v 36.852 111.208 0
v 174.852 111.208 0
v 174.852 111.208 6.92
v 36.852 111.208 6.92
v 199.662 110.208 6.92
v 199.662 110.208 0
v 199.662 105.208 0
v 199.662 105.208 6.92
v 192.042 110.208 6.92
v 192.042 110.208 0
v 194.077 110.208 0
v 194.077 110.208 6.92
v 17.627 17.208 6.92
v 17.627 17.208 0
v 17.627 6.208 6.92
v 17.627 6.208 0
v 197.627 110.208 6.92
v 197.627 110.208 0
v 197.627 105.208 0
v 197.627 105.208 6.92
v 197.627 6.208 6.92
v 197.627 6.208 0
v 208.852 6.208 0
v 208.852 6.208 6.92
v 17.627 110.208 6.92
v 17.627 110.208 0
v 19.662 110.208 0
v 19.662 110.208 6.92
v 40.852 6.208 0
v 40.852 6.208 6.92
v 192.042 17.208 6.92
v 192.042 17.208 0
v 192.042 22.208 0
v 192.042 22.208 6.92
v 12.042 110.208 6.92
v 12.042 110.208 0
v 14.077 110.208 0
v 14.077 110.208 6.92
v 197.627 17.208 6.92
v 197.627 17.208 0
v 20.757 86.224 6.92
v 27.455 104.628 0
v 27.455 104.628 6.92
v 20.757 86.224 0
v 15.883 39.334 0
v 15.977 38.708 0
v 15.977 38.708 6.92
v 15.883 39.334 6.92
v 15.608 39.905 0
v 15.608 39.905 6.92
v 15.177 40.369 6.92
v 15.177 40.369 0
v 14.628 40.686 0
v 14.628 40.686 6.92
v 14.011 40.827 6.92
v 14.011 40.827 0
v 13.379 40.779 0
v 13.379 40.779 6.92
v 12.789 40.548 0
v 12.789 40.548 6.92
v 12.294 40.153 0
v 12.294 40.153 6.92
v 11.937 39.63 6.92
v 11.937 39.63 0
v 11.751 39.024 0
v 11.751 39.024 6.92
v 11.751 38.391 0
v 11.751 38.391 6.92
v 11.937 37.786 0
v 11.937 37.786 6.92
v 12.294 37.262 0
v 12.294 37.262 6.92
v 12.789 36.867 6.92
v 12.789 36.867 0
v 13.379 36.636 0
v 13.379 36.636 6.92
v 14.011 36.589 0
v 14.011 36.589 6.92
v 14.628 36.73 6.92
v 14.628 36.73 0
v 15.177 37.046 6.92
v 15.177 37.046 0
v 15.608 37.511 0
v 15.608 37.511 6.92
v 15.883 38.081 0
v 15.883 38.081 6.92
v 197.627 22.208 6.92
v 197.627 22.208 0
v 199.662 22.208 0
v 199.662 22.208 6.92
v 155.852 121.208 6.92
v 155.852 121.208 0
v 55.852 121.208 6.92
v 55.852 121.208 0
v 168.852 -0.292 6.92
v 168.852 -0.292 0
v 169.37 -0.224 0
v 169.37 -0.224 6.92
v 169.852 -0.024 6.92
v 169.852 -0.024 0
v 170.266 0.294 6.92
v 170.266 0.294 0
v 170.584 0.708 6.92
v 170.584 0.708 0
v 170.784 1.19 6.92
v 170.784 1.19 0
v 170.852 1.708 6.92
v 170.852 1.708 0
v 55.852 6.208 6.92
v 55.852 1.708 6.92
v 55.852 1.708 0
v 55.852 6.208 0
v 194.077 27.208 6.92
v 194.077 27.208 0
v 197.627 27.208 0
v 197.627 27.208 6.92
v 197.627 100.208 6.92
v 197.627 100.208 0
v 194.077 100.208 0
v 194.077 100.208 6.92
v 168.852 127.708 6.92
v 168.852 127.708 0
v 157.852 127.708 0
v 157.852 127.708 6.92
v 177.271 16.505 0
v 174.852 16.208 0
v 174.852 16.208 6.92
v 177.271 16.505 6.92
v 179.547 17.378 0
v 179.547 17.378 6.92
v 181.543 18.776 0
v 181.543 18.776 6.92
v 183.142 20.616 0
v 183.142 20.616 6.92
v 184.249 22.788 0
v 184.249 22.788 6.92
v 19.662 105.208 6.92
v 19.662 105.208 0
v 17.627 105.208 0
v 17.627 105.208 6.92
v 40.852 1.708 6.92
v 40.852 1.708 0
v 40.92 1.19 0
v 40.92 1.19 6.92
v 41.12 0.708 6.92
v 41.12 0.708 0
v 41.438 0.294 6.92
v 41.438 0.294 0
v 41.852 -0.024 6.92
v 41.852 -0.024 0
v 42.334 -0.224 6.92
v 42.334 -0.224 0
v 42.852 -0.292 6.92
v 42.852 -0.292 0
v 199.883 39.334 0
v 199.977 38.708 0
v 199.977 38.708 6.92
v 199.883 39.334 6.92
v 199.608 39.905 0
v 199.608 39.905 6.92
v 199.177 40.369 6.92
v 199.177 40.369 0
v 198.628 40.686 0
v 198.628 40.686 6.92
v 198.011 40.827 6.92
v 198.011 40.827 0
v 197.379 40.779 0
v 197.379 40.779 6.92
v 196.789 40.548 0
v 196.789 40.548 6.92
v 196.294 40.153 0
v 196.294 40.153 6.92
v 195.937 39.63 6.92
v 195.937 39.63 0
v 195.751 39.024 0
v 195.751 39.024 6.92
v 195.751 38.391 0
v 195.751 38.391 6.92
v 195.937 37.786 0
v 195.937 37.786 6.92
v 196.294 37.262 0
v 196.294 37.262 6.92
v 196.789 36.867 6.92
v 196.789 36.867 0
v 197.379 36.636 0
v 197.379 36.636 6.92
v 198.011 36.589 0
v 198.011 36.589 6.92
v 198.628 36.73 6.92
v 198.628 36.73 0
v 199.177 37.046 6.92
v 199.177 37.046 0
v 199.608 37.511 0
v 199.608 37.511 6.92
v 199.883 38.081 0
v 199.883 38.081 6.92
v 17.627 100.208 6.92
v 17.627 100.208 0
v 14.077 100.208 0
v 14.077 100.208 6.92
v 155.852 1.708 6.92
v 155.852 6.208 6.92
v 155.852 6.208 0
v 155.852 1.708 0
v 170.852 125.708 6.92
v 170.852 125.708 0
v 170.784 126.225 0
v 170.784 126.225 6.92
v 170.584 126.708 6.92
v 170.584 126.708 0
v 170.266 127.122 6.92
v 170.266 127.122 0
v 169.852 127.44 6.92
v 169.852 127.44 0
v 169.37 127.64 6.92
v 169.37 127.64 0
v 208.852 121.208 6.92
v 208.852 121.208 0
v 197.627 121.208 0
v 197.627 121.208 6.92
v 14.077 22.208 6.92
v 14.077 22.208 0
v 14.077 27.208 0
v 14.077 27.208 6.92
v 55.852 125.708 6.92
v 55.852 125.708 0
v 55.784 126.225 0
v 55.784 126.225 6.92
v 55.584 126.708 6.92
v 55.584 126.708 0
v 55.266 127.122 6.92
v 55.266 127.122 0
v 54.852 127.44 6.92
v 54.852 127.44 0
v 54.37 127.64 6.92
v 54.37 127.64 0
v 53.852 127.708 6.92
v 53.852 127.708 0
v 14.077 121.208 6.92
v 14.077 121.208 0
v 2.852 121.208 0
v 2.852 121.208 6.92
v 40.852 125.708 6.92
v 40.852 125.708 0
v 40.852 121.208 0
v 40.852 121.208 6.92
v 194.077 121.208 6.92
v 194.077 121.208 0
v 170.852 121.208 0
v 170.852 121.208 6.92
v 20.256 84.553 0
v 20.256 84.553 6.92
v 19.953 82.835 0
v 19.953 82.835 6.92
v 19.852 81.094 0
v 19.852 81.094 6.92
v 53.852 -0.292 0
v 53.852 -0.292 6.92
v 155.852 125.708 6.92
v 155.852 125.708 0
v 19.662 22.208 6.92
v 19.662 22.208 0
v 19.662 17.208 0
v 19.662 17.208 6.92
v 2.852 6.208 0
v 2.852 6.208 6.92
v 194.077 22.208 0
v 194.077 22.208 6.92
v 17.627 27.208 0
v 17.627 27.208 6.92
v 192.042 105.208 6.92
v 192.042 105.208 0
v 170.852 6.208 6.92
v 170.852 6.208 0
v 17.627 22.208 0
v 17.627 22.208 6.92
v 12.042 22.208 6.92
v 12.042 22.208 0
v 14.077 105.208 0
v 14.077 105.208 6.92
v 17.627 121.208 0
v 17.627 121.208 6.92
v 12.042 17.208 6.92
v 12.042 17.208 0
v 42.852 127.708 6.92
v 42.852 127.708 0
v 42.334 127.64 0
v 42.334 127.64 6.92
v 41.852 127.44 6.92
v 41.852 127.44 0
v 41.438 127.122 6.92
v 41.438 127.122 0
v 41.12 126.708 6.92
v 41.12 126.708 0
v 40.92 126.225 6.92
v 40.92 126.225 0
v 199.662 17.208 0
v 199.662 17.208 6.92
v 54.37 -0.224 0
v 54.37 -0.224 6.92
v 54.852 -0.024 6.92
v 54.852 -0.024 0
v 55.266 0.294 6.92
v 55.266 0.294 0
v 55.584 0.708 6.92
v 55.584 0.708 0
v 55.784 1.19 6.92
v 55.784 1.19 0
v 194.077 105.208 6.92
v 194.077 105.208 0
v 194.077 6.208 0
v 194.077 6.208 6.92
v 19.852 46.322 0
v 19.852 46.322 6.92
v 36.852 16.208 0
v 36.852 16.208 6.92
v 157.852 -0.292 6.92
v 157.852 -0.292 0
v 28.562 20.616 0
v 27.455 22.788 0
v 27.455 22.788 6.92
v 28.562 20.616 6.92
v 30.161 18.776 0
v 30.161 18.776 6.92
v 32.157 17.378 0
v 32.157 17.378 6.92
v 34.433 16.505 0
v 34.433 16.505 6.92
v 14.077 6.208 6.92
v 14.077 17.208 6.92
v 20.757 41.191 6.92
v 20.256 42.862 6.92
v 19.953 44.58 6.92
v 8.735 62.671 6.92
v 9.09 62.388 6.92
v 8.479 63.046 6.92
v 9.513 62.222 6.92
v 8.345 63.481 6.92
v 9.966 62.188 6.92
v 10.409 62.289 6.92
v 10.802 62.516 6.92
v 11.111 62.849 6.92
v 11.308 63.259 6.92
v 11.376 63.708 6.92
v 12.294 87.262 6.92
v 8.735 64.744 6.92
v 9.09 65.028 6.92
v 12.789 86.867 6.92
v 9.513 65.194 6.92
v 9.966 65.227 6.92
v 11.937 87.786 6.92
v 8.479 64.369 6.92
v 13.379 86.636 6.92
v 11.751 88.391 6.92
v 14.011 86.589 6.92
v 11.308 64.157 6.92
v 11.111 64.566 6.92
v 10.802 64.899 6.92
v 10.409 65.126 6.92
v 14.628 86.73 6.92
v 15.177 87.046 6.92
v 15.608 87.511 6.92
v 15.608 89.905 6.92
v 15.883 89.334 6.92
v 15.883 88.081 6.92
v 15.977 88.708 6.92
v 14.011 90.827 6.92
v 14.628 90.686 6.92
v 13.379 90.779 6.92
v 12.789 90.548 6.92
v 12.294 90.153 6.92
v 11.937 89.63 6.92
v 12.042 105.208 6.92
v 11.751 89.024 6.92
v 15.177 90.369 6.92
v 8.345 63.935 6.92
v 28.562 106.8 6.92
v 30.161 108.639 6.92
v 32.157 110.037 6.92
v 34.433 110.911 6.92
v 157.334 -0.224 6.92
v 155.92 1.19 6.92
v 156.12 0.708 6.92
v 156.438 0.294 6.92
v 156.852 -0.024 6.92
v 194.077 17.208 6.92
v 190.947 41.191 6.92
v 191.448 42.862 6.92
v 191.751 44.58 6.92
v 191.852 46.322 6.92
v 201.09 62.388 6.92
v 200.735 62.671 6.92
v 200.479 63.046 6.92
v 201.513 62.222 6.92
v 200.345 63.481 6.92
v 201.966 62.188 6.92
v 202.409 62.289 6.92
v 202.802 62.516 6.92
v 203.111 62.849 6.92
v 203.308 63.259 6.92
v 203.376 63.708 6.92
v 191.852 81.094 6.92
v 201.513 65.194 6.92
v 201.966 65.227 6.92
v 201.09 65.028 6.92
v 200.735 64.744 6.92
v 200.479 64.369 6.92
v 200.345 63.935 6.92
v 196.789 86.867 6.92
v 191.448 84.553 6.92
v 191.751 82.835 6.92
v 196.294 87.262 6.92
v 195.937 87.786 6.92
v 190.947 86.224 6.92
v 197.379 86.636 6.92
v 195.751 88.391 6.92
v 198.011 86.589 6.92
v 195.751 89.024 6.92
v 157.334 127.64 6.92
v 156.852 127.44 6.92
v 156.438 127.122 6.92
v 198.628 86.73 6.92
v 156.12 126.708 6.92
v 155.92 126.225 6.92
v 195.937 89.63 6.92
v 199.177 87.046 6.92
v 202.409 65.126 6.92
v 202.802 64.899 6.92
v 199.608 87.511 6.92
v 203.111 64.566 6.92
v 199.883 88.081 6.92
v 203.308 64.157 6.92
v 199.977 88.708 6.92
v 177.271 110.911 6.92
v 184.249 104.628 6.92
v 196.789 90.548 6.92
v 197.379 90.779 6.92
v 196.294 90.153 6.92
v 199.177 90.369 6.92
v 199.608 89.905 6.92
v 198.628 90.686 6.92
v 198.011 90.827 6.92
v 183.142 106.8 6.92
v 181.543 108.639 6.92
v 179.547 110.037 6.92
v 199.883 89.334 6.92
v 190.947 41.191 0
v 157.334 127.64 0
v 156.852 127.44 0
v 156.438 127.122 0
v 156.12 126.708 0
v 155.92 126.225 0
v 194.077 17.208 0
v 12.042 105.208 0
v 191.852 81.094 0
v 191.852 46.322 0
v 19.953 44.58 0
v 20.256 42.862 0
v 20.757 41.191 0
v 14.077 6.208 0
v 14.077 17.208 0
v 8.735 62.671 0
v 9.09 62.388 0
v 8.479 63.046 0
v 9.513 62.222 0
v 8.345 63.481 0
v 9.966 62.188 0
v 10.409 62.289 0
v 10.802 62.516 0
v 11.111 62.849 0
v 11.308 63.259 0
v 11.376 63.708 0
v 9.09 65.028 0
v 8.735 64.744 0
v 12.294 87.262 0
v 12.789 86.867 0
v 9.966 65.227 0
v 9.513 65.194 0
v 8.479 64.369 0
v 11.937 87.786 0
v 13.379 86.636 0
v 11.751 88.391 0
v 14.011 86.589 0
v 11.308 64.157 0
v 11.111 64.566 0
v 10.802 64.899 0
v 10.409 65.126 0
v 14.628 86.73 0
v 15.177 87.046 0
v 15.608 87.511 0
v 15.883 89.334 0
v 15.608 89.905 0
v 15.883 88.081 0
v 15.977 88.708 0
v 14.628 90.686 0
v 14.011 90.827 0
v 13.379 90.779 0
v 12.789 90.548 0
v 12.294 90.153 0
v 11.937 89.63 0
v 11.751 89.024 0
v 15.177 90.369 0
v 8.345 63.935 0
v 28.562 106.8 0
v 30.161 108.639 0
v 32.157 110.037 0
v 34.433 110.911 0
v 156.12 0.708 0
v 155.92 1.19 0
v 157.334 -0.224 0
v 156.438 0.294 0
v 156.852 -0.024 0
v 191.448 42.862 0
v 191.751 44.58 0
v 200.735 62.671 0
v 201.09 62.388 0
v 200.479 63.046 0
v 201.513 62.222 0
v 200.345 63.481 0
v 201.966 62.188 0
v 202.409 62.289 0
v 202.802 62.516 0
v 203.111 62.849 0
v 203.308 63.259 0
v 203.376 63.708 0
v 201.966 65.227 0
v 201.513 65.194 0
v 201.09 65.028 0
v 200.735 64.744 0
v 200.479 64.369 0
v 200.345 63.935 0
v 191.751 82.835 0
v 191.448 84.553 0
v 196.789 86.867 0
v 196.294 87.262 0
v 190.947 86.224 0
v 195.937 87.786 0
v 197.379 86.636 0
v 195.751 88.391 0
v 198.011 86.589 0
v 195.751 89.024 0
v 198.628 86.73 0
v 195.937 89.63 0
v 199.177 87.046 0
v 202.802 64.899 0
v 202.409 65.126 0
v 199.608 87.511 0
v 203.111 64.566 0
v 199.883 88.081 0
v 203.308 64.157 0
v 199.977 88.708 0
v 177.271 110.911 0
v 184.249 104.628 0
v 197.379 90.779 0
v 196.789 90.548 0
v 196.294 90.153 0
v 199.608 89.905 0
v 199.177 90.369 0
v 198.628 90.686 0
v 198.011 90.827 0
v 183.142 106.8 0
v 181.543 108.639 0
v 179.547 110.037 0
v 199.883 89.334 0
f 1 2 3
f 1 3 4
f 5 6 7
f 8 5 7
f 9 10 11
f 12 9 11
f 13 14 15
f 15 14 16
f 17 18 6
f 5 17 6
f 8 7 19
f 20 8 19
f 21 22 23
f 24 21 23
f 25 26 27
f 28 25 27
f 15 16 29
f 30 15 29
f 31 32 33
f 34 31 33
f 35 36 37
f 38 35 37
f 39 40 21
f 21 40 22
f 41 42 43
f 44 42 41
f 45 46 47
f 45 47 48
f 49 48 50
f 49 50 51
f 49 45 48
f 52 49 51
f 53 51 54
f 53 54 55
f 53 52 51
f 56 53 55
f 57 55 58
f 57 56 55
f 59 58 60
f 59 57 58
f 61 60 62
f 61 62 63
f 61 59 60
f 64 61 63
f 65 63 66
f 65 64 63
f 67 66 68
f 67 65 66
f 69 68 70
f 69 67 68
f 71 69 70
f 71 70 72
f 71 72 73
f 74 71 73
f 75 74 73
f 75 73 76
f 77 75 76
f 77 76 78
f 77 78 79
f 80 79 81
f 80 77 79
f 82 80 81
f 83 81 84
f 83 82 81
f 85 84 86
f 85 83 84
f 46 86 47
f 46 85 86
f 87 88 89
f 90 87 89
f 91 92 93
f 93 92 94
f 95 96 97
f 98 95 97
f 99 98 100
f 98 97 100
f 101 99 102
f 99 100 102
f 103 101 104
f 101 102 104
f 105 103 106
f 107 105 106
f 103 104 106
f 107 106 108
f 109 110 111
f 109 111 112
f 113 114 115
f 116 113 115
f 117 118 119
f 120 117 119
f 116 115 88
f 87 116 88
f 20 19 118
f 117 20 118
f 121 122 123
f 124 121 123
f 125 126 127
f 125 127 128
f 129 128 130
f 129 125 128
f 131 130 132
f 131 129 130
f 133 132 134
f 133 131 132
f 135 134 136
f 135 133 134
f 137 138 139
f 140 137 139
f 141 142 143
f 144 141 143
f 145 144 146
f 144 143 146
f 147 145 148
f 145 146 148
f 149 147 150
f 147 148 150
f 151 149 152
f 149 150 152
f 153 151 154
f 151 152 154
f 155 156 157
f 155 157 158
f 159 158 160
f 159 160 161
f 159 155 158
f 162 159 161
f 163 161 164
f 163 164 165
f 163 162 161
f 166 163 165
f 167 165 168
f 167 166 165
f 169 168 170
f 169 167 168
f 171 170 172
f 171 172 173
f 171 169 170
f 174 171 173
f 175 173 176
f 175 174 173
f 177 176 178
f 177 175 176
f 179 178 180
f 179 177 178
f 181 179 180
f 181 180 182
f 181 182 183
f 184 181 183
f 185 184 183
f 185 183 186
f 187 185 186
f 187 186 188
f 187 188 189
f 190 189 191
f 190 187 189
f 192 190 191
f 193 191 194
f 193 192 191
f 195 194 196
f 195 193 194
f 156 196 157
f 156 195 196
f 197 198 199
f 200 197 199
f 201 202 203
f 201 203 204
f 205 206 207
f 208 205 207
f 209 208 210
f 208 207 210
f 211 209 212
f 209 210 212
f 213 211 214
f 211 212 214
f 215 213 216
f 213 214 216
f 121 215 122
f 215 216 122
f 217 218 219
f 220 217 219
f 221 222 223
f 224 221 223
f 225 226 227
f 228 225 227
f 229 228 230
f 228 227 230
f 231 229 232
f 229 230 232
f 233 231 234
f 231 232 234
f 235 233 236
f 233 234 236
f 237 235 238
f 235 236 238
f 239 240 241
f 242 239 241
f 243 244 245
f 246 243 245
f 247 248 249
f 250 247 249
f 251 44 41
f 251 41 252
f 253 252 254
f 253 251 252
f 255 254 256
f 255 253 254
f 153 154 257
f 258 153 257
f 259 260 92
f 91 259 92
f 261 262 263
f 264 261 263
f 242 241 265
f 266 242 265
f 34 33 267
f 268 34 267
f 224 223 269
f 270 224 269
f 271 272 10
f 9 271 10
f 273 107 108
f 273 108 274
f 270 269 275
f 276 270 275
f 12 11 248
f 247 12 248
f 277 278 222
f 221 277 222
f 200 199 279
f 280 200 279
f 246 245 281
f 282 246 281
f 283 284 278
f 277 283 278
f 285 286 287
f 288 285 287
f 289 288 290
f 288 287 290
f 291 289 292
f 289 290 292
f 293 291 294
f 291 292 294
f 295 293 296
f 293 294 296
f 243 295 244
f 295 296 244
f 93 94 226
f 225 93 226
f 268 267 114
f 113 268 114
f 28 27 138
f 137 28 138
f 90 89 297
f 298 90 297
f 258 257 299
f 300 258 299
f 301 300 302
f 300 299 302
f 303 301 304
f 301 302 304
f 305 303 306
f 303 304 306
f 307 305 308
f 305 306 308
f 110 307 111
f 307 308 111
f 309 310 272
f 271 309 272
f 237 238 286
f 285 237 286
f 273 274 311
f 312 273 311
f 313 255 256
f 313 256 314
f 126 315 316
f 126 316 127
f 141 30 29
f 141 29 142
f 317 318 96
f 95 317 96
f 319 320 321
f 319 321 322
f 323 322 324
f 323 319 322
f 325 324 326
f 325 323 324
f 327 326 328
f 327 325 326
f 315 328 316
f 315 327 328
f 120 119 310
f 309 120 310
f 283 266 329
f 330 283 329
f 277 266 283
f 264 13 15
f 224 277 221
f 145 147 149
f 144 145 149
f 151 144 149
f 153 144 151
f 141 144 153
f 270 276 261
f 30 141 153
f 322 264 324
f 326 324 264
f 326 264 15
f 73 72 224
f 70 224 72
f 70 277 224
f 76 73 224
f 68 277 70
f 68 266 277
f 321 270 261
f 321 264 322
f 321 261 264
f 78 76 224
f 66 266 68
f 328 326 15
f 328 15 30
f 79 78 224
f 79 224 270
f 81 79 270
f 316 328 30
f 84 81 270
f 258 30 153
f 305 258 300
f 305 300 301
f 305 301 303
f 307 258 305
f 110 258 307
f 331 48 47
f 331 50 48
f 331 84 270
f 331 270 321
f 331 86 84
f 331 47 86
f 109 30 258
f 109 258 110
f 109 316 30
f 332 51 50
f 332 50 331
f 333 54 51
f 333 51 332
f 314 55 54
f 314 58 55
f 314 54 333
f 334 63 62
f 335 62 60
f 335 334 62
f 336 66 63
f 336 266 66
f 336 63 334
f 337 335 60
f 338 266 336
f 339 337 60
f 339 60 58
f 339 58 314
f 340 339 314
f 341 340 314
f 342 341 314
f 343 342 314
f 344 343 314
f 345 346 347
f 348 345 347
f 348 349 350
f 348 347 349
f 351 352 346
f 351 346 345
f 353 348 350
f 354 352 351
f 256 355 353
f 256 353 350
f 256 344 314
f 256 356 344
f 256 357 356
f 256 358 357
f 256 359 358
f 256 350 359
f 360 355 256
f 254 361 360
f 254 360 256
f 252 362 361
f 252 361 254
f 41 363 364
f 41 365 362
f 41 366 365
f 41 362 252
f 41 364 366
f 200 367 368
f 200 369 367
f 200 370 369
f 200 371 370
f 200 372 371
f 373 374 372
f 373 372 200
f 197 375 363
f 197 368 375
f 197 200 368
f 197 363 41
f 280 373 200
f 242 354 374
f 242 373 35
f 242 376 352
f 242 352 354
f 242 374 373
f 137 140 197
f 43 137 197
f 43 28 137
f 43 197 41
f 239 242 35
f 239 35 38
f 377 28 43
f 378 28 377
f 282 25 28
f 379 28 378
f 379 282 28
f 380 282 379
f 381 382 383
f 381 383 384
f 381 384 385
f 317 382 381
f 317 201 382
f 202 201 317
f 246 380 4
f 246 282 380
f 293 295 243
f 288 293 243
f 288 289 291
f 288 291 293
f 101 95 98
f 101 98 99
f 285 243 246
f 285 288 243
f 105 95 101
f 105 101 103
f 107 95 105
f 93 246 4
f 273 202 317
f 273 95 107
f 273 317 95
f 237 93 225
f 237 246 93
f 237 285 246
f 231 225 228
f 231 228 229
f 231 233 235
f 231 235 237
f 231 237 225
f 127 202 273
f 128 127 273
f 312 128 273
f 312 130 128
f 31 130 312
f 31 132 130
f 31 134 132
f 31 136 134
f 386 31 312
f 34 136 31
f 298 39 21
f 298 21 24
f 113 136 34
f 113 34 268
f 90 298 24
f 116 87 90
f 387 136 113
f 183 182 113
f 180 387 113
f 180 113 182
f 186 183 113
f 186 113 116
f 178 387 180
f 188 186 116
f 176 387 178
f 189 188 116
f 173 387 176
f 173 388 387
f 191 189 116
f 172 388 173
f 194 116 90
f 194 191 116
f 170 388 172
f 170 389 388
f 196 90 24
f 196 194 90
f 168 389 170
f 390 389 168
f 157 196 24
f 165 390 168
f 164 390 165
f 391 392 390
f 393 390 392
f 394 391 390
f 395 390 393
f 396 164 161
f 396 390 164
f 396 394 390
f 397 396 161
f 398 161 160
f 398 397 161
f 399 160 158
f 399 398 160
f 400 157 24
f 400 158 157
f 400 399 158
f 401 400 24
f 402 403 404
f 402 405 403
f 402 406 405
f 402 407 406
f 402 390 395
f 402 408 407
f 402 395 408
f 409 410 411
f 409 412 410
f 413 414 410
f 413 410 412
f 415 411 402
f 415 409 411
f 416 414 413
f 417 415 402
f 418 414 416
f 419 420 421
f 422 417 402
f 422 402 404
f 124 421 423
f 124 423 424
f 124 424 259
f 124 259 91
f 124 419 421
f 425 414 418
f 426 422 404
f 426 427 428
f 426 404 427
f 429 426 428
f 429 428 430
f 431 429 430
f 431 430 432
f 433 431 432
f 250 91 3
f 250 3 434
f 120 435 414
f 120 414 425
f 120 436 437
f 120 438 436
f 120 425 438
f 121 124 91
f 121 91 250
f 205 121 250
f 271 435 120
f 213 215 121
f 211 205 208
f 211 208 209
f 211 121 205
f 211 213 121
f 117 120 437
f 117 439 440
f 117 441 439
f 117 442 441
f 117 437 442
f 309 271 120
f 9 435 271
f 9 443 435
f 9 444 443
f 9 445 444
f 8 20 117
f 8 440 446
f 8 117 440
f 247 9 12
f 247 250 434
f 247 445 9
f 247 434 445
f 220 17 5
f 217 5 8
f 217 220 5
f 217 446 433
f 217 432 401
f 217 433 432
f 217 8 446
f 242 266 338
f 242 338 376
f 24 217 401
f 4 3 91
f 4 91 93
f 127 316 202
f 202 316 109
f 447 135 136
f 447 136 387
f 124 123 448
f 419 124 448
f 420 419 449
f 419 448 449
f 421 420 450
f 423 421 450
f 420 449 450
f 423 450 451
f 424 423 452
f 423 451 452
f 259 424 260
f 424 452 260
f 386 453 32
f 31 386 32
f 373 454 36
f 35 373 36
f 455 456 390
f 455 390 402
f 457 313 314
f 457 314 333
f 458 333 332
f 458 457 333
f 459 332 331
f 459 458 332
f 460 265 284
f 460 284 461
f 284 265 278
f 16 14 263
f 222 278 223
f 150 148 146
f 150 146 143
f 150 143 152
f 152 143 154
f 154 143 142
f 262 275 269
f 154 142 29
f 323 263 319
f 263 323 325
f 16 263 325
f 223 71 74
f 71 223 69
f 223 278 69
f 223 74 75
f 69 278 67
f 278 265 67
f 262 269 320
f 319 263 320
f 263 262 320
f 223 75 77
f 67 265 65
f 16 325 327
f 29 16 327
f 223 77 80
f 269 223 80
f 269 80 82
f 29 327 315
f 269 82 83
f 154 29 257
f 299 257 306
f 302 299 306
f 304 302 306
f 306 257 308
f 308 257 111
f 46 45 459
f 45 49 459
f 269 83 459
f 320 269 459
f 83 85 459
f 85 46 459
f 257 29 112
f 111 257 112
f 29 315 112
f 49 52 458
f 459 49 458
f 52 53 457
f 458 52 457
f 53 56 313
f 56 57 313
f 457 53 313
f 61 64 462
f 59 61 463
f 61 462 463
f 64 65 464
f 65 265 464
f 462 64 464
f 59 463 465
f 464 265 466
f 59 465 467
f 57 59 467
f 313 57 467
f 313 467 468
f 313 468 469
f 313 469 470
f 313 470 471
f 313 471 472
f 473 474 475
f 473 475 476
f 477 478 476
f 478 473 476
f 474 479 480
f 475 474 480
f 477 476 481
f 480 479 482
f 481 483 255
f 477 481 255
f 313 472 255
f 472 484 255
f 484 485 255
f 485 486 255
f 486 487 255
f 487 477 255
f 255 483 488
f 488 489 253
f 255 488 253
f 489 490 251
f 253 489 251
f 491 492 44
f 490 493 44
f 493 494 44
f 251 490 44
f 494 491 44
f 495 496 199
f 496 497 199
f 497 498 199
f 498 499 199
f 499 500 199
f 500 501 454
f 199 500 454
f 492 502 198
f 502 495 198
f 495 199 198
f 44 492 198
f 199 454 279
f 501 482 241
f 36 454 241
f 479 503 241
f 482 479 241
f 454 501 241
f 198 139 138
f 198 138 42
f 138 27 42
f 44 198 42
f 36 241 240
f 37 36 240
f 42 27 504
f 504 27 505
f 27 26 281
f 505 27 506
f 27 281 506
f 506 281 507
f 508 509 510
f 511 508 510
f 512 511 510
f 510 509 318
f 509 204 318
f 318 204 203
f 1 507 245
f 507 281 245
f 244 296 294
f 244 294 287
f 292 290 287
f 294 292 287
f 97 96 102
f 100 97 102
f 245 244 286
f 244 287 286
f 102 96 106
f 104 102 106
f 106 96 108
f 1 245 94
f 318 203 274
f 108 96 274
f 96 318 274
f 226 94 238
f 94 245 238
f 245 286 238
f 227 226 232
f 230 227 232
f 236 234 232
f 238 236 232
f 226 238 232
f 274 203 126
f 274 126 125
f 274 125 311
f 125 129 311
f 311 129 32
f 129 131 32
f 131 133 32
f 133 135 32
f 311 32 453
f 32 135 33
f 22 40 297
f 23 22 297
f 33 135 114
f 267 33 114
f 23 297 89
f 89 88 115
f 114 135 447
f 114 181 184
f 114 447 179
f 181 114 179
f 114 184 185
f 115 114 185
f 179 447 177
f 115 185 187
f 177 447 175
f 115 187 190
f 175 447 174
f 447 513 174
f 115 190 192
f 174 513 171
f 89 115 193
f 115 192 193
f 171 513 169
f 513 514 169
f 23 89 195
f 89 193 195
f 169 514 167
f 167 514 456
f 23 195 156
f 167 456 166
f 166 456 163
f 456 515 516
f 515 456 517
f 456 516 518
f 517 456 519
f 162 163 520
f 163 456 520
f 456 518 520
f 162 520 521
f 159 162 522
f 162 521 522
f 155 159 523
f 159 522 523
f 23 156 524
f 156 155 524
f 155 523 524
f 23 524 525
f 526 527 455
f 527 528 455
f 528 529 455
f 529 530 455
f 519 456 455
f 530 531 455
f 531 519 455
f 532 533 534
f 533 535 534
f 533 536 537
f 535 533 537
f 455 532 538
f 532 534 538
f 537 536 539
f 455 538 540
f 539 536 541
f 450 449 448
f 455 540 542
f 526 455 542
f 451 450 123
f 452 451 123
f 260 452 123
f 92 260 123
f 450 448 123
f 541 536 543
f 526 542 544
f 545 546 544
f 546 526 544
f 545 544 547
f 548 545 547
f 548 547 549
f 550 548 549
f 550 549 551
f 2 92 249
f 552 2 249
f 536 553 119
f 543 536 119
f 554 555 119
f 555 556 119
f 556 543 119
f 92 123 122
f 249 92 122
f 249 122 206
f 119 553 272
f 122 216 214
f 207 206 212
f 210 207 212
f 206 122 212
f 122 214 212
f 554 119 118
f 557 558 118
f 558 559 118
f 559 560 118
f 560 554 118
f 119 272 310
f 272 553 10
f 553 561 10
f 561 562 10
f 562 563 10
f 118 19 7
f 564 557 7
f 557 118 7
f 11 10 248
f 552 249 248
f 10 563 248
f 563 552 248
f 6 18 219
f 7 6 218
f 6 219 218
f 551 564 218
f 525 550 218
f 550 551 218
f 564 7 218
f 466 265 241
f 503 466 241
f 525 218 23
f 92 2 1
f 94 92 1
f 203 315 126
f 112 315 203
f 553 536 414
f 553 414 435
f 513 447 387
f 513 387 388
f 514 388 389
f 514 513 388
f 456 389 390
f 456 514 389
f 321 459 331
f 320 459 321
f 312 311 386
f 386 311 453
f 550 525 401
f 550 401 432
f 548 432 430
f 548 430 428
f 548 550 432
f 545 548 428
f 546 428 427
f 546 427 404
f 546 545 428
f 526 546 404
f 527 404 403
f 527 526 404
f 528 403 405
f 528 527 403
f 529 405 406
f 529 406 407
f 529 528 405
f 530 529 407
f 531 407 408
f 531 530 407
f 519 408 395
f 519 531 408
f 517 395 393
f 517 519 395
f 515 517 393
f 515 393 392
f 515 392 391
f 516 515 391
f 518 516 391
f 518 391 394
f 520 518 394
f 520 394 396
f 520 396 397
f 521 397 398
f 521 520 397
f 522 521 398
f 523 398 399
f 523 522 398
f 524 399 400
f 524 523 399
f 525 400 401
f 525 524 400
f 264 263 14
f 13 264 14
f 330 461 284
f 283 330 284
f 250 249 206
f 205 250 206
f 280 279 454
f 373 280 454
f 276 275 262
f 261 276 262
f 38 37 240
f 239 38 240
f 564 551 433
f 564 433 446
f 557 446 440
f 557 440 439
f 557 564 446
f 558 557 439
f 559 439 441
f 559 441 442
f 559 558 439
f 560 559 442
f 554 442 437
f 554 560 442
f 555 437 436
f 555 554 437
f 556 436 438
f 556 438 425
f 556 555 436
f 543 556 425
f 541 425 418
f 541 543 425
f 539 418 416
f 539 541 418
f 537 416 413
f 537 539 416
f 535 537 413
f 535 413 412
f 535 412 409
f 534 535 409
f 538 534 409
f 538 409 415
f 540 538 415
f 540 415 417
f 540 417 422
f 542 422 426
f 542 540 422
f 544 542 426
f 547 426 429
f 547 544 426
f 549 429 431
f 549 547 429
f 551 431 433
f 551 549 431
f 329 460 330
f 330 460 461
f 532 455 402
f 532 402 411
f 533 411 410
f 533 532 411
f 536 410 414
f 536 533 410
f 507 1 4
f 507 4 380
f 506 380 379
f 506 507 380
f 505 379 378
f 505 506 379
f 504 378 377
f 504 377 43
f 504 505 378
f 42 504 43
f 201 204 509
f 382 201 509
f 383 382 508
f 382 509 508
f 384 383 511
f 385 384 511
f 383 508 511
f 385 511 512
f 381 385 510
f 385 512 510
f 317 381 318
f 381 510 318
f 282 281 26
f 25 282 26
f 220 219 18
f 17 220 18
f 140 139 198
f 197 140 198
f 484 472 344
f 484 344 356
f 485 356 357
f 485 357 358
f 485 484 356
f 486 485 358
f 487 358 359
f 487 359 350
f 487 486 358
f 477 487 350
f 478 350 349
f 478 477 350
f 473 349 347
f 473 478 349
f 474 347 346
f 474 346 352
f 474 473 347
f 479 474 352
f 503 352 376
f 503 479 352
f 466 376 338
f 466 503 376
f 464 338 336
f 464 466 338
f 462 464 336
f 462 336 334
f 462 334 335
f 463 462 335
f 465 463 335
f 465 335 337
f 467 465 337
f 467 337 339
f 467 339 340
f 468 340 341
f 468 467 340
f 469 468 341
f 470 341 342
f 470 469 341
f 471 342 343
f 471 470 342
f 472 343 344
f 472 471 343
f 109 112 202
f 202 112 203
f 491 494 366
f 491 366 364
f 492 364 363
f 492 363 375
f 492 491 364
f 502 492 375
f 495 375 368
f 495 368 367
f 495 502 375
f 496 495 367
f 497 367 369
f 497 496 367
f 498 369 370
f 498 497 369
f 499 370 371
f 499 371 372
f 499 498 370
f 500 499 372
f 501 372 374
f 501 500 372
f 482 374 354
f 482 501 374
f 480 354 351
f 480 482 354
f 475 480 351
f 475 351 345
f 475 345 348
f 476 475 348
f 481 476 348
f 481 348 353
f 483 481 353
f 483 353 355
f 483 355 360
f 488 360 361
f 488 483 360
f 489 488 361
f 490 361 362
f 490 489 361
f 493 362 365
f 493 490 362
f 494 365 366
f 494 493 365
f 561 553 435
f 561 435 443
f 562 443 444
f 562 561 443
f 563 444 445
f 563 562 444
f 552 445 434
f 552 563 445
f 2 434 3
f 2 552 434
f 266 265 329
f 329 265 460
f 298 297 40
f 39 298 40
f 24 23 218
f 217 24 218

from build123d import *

# Parameters (mm, degrees)
SKETCH1_R           = 2.125
SKETCH1_R_2         = 1.524
BOSS_EXTRUDE1_DEPTH = 6.92


with BuildPart() as part:
    # Sketch1 → Boss-Extrude1 (new body)
    with BuildSketch(Plane.XY):
        with BuildLine():
            Line((192.041969112, 105.207722008), (192.041969112, 110.207722008))
            Line((192.041969112, 110.207722008), (194.076969112, 110.207722008))
            Line((194.076969112, 110.207722008), (194.076969112, 121.207722008))
            Line((194.076969112, 121.207722008), (170.851969112, 121.207722008))
            Line((170.851969112, 121.207722008), (170.851969112, 125.707722008))
            ThreePointArc((170.851969112, 125.707722008), (170.266182674, 127.12193557), (168.851969112, 127.707722008))
            Line((168.851969112, 127.707722008), (157.851969112, 127.707722008))
            ThreePointArc((157.851969112, 127.707722008), (156.43775555, 127.12193557), (155.851969112, 125.707722008))
            Line((155.851969112, 125.707722008), (155.851969112, 121.207722008))
            Line((155.851969112, 121.207722008), (55.851969112, 121.207722008))
            Line((55.851969112, 121.207722008), (55.851969112, 125.707722008))
            ThreePointArc((55.851969112, 125.707722008), (55.266182674, 127.12193557), (53.851969112, 127.707722008))
            Line((53.851969112, 127.707722008), (42.851969112, 127.707722008))
            ThreePointArc((42.851969112, 127.707722008), (41.43775555, 127.12193557), (40.851969112, 125.707722008))
            Line((40.851969112, 125.707722008), (40.851969112, 121.207722008))
            Line((40.851969112, 121.207722008), (17.626969112, 121.207722008))
            Line((17.626969112, 121.207722008), (17.626969112, 110.207722008))
            Line((17.626969112, 110.207722008), (19.661969112, 110.207722008))
            Line((19.661969112, 110.207722008), (19.661969112, 105.207722008))
            Line((19.661969112, 105.207722008), (17.626969112, 105.207722008))
            Line((17.626969112, 105.207722008), (17.626969112, 100.207722008))
            Line((17.626969112, 100.207722008), (14.076969112, 100.207722008))
            Line((14.076969112, 100.207722008), (14.076969112, 105.207722008))
            Line((14.076969112, 105.207722008), (12.041969112, 105.207722008))
            Line((12.041969112, 105.207722008), (12.041969112, 110.207722008))
            Line((12.041969112, 110.207722008), (14.076969112, 110.207722008))
            Line((14.076969112, 110.207722008), (14.076969112, 121.207722008))
            Line((14.076969112, 121.207722008), (2.851969112, 121.207722008))
            Line((2.851969112, 121.207722008), (2.851969112, 6.207722008))
            Line((2.851969112, 6.207722008), (14.076969112, 6.207722008))
            Line((14.076969112, 6.207722008), (14.076969112, 17.207722008))
            Line((14.076969112, 17.207722008), (12.041969112, 17.207722008))
            Line((12.041969112, 17.207722008), (12.041969112, 22.207722008))
            Line((12.041969112, 22.207722008), (14.076969112, 22.207722008))
            Line((14.076969112, 22.207722008), (14.076969112, 27.207722008))
            Line((14.076969112, 27.207722008), (17.626969112, 27.207722008))
            Line((17.626969112, 27.207722008), (17.626969112, 22.207722008))
            Line((17.626969112, 22.207722008), (19.661969112, 22.207722008))
            Line((19.661969112, 22.207722008), (19.661969112, 17.207722008))
            Line((19.661969112, 17.207722008), (17.626969112, 17.207722008))
            Line((17.626969112, 17.207722008), (17.626969112, 6.207722008))
            Line((17.626969112, 6.207722008), (40.851969112, 6.207722008))
            Line((40.851969112, 6.207722008), (40.851969112, 1.707722008))
            ThreePointArc((40.851969112, 1.707722008), (41.43775555, 0.293508445), (42.851969112, -0.292277992))
            Line((42.851969112, -0.292277992), (53.851969112, -0.292277992))
            ThreePointArc((53.851969112, -0.292277992), (55.266182674, 0.293508445), (55.851969112, 1.707722008))
            Line((55.851969112, 1.707722008), (55.851969112, 6.207722008))
            Line((55.851969112, 6.207722008), (155.851969112, 6.207722008))
            Line((155.851969112, 6.207722008), (155.851969112, 1.707722008))
            ThreePointArc((155.851969112, 1.707722008), (156.43775555, 0.293508445), (157.851969112, -0.292277992))
            Line((157.851969112, -0.292277992), (168.851969112, -0.292277992))
            ThreePointArc((168.851969112, -0.292277992), (170.266182674, 0.293508445), (170.851969112, 1.707722008))
            Line((170.851969112, 1.707722008), (170.851969112, 6.207722008))
            Line((170.851969112, 6.207722008), (194.076969112, 6.207722008))
            Line((194.076969112, 6.207722008), (194.076969112, 17.207722008))
            Line((194.076969112, 17.207722008), (192.041969112, 17.207722008))
            Line((192.041969112, 17.207722008), (192.041969112, 22.207722008))
            Line((192.041969112, 22.207722008), (194.076969112, 22.207722008))
            Line((194.076969112, 22.207722008), (194.076969112, 27.207722008))
            Line((194.076969112, 27.207722008), (197.626969112, 27.207722008))
            Line((197.626969112, 27.207722008), (197.626969112, 22.207722008))
            Line((197.626969112, 22.207722008), (199.661969112, 22.207722008))
            Line((199.661969112, 22.207722008), (199.661969112, 17.207722008))
            Line((199.661969112, 17.207722008), (197.626969112, 17.207722008))
            Line((197.626969112, 17.207722008), (197.626969112, 6.207722008))
            Line((197.626969112, 6.207722008), (208.851969112, 6.207722008))
            Line((208.851969112, 6.207722008), (208.851969112, 121.207722008))
            Line((208.851969112, 121.207722008), (197.626969112, 121.207722008))
            Line((197.626969112, 121.207722008), (197.626969112, 110.207722008))
            Line((197.626969112, 110.207722008), (199.661969112, 110.207722008))
            Line((199.661969112, 110.207722008), (199.661969112, 105.207722008))
            Line((199.661969112, 105.207722008), (197.626969112, 105.207722008))
            Line((197.626969112, 105.207722008), (197.626969112, 100.207722008))
            Line((197.626969112, 100.207722008), (194.076969112, 100.207722008))
            Line((194.076969112, 100.207722008), (194.076969112, 105.207722008))
            Line((194.076969112, 105.207722008), (192.041969112, 105.207722008))
        make_face()
        with Locations((13.851969112, 38.707722008)):
            Circle(SKETCH1_R, mode=Mode.SUBTRACT)
        with Locations((197.851969112, 88.707722008)):
            Circle(SKETCH1_R, mode=Mode.SUBTRACT)
        with Locations((13.851969112, 88.707722008)):
            Circle(SKETCH1_R, mode=Mode.SUBTRACT)
        with Locations((197.851969112, 38.707722008)):
            Circle(SKETCH1_R, mode=Mode.SUBTRACT)
        with Locations((9.851969112, 63.707722008)):
            Circle(SKETCH1_R_2, mode=Mode.SUBTRACT)
        with Locations((201.851969112, 63.707722008)):
            Circle(SKETCH1_R_2, mode=Mode.SUBTRACT)
        with BuildLine():
            Line((19.851969112, 81.093745168), (19.851969112, 46.321698847))
            ThreePointArc((19.851969112, 46.321698847), (20.079852817, 43.716976182), (20.7565798, 41.191396698))
            Line((20.7565798, 41.191396698), (27.455042904, 22.787520574))
            ThreePointArc((27.455042904, 22.787520574), (31.116204748, 18.016201565), (36.851969112, 16.207722008))
            Line((36.851969112, 16.207722008), (174.851969112, 16.207722008))
            ThreePointArc((174.851969112, 16.207722008), (180.587733475, 18.016201565), (184.24889532, 22.787520574))
            Line((184.24889532, 22.787520574), (190.947358424, 41.191396698))
            ThreePointArc((190.947358424, 41.191396698), (191.624085407, 43.716976182), (191.851969112, 46.321698847))
            Line((191.851969112, 46.321698847), (191.851969112, 81.093745168))
            ThreePointArc((191.851969112, 81.093745168), (191.624085407, 83.698467833), (190.947358424, 86.224047318))
            Line((190.947358424, 86.224047318), (184.24889532, 104.627923441))
            ThreePointArc((184.24889532, 104.627923441), (180.587733475, 109.399242451), (174.851969112, 111.207722008))
            Line((174.851969112, 111.207722008), (36.851969112, 111.207722008))
            ThreePointArc((36.851969112, 111.207722008), (31.116204748, 109.399242451), (27.455042904, 104.627923441))
            Line((27.455042904, 104.627923441), (20.7565798, 86.224047318))
            ThreePointArc((20.7565798, 86.224047318), (20.079852817, 83.698467833), (19.851969112, 81.093745168))
        make_face(mode=Mode.SUBTRACT)
    extrude(amount=BOSS_EXTRUDE1_DEPTH)


solid = part.part
